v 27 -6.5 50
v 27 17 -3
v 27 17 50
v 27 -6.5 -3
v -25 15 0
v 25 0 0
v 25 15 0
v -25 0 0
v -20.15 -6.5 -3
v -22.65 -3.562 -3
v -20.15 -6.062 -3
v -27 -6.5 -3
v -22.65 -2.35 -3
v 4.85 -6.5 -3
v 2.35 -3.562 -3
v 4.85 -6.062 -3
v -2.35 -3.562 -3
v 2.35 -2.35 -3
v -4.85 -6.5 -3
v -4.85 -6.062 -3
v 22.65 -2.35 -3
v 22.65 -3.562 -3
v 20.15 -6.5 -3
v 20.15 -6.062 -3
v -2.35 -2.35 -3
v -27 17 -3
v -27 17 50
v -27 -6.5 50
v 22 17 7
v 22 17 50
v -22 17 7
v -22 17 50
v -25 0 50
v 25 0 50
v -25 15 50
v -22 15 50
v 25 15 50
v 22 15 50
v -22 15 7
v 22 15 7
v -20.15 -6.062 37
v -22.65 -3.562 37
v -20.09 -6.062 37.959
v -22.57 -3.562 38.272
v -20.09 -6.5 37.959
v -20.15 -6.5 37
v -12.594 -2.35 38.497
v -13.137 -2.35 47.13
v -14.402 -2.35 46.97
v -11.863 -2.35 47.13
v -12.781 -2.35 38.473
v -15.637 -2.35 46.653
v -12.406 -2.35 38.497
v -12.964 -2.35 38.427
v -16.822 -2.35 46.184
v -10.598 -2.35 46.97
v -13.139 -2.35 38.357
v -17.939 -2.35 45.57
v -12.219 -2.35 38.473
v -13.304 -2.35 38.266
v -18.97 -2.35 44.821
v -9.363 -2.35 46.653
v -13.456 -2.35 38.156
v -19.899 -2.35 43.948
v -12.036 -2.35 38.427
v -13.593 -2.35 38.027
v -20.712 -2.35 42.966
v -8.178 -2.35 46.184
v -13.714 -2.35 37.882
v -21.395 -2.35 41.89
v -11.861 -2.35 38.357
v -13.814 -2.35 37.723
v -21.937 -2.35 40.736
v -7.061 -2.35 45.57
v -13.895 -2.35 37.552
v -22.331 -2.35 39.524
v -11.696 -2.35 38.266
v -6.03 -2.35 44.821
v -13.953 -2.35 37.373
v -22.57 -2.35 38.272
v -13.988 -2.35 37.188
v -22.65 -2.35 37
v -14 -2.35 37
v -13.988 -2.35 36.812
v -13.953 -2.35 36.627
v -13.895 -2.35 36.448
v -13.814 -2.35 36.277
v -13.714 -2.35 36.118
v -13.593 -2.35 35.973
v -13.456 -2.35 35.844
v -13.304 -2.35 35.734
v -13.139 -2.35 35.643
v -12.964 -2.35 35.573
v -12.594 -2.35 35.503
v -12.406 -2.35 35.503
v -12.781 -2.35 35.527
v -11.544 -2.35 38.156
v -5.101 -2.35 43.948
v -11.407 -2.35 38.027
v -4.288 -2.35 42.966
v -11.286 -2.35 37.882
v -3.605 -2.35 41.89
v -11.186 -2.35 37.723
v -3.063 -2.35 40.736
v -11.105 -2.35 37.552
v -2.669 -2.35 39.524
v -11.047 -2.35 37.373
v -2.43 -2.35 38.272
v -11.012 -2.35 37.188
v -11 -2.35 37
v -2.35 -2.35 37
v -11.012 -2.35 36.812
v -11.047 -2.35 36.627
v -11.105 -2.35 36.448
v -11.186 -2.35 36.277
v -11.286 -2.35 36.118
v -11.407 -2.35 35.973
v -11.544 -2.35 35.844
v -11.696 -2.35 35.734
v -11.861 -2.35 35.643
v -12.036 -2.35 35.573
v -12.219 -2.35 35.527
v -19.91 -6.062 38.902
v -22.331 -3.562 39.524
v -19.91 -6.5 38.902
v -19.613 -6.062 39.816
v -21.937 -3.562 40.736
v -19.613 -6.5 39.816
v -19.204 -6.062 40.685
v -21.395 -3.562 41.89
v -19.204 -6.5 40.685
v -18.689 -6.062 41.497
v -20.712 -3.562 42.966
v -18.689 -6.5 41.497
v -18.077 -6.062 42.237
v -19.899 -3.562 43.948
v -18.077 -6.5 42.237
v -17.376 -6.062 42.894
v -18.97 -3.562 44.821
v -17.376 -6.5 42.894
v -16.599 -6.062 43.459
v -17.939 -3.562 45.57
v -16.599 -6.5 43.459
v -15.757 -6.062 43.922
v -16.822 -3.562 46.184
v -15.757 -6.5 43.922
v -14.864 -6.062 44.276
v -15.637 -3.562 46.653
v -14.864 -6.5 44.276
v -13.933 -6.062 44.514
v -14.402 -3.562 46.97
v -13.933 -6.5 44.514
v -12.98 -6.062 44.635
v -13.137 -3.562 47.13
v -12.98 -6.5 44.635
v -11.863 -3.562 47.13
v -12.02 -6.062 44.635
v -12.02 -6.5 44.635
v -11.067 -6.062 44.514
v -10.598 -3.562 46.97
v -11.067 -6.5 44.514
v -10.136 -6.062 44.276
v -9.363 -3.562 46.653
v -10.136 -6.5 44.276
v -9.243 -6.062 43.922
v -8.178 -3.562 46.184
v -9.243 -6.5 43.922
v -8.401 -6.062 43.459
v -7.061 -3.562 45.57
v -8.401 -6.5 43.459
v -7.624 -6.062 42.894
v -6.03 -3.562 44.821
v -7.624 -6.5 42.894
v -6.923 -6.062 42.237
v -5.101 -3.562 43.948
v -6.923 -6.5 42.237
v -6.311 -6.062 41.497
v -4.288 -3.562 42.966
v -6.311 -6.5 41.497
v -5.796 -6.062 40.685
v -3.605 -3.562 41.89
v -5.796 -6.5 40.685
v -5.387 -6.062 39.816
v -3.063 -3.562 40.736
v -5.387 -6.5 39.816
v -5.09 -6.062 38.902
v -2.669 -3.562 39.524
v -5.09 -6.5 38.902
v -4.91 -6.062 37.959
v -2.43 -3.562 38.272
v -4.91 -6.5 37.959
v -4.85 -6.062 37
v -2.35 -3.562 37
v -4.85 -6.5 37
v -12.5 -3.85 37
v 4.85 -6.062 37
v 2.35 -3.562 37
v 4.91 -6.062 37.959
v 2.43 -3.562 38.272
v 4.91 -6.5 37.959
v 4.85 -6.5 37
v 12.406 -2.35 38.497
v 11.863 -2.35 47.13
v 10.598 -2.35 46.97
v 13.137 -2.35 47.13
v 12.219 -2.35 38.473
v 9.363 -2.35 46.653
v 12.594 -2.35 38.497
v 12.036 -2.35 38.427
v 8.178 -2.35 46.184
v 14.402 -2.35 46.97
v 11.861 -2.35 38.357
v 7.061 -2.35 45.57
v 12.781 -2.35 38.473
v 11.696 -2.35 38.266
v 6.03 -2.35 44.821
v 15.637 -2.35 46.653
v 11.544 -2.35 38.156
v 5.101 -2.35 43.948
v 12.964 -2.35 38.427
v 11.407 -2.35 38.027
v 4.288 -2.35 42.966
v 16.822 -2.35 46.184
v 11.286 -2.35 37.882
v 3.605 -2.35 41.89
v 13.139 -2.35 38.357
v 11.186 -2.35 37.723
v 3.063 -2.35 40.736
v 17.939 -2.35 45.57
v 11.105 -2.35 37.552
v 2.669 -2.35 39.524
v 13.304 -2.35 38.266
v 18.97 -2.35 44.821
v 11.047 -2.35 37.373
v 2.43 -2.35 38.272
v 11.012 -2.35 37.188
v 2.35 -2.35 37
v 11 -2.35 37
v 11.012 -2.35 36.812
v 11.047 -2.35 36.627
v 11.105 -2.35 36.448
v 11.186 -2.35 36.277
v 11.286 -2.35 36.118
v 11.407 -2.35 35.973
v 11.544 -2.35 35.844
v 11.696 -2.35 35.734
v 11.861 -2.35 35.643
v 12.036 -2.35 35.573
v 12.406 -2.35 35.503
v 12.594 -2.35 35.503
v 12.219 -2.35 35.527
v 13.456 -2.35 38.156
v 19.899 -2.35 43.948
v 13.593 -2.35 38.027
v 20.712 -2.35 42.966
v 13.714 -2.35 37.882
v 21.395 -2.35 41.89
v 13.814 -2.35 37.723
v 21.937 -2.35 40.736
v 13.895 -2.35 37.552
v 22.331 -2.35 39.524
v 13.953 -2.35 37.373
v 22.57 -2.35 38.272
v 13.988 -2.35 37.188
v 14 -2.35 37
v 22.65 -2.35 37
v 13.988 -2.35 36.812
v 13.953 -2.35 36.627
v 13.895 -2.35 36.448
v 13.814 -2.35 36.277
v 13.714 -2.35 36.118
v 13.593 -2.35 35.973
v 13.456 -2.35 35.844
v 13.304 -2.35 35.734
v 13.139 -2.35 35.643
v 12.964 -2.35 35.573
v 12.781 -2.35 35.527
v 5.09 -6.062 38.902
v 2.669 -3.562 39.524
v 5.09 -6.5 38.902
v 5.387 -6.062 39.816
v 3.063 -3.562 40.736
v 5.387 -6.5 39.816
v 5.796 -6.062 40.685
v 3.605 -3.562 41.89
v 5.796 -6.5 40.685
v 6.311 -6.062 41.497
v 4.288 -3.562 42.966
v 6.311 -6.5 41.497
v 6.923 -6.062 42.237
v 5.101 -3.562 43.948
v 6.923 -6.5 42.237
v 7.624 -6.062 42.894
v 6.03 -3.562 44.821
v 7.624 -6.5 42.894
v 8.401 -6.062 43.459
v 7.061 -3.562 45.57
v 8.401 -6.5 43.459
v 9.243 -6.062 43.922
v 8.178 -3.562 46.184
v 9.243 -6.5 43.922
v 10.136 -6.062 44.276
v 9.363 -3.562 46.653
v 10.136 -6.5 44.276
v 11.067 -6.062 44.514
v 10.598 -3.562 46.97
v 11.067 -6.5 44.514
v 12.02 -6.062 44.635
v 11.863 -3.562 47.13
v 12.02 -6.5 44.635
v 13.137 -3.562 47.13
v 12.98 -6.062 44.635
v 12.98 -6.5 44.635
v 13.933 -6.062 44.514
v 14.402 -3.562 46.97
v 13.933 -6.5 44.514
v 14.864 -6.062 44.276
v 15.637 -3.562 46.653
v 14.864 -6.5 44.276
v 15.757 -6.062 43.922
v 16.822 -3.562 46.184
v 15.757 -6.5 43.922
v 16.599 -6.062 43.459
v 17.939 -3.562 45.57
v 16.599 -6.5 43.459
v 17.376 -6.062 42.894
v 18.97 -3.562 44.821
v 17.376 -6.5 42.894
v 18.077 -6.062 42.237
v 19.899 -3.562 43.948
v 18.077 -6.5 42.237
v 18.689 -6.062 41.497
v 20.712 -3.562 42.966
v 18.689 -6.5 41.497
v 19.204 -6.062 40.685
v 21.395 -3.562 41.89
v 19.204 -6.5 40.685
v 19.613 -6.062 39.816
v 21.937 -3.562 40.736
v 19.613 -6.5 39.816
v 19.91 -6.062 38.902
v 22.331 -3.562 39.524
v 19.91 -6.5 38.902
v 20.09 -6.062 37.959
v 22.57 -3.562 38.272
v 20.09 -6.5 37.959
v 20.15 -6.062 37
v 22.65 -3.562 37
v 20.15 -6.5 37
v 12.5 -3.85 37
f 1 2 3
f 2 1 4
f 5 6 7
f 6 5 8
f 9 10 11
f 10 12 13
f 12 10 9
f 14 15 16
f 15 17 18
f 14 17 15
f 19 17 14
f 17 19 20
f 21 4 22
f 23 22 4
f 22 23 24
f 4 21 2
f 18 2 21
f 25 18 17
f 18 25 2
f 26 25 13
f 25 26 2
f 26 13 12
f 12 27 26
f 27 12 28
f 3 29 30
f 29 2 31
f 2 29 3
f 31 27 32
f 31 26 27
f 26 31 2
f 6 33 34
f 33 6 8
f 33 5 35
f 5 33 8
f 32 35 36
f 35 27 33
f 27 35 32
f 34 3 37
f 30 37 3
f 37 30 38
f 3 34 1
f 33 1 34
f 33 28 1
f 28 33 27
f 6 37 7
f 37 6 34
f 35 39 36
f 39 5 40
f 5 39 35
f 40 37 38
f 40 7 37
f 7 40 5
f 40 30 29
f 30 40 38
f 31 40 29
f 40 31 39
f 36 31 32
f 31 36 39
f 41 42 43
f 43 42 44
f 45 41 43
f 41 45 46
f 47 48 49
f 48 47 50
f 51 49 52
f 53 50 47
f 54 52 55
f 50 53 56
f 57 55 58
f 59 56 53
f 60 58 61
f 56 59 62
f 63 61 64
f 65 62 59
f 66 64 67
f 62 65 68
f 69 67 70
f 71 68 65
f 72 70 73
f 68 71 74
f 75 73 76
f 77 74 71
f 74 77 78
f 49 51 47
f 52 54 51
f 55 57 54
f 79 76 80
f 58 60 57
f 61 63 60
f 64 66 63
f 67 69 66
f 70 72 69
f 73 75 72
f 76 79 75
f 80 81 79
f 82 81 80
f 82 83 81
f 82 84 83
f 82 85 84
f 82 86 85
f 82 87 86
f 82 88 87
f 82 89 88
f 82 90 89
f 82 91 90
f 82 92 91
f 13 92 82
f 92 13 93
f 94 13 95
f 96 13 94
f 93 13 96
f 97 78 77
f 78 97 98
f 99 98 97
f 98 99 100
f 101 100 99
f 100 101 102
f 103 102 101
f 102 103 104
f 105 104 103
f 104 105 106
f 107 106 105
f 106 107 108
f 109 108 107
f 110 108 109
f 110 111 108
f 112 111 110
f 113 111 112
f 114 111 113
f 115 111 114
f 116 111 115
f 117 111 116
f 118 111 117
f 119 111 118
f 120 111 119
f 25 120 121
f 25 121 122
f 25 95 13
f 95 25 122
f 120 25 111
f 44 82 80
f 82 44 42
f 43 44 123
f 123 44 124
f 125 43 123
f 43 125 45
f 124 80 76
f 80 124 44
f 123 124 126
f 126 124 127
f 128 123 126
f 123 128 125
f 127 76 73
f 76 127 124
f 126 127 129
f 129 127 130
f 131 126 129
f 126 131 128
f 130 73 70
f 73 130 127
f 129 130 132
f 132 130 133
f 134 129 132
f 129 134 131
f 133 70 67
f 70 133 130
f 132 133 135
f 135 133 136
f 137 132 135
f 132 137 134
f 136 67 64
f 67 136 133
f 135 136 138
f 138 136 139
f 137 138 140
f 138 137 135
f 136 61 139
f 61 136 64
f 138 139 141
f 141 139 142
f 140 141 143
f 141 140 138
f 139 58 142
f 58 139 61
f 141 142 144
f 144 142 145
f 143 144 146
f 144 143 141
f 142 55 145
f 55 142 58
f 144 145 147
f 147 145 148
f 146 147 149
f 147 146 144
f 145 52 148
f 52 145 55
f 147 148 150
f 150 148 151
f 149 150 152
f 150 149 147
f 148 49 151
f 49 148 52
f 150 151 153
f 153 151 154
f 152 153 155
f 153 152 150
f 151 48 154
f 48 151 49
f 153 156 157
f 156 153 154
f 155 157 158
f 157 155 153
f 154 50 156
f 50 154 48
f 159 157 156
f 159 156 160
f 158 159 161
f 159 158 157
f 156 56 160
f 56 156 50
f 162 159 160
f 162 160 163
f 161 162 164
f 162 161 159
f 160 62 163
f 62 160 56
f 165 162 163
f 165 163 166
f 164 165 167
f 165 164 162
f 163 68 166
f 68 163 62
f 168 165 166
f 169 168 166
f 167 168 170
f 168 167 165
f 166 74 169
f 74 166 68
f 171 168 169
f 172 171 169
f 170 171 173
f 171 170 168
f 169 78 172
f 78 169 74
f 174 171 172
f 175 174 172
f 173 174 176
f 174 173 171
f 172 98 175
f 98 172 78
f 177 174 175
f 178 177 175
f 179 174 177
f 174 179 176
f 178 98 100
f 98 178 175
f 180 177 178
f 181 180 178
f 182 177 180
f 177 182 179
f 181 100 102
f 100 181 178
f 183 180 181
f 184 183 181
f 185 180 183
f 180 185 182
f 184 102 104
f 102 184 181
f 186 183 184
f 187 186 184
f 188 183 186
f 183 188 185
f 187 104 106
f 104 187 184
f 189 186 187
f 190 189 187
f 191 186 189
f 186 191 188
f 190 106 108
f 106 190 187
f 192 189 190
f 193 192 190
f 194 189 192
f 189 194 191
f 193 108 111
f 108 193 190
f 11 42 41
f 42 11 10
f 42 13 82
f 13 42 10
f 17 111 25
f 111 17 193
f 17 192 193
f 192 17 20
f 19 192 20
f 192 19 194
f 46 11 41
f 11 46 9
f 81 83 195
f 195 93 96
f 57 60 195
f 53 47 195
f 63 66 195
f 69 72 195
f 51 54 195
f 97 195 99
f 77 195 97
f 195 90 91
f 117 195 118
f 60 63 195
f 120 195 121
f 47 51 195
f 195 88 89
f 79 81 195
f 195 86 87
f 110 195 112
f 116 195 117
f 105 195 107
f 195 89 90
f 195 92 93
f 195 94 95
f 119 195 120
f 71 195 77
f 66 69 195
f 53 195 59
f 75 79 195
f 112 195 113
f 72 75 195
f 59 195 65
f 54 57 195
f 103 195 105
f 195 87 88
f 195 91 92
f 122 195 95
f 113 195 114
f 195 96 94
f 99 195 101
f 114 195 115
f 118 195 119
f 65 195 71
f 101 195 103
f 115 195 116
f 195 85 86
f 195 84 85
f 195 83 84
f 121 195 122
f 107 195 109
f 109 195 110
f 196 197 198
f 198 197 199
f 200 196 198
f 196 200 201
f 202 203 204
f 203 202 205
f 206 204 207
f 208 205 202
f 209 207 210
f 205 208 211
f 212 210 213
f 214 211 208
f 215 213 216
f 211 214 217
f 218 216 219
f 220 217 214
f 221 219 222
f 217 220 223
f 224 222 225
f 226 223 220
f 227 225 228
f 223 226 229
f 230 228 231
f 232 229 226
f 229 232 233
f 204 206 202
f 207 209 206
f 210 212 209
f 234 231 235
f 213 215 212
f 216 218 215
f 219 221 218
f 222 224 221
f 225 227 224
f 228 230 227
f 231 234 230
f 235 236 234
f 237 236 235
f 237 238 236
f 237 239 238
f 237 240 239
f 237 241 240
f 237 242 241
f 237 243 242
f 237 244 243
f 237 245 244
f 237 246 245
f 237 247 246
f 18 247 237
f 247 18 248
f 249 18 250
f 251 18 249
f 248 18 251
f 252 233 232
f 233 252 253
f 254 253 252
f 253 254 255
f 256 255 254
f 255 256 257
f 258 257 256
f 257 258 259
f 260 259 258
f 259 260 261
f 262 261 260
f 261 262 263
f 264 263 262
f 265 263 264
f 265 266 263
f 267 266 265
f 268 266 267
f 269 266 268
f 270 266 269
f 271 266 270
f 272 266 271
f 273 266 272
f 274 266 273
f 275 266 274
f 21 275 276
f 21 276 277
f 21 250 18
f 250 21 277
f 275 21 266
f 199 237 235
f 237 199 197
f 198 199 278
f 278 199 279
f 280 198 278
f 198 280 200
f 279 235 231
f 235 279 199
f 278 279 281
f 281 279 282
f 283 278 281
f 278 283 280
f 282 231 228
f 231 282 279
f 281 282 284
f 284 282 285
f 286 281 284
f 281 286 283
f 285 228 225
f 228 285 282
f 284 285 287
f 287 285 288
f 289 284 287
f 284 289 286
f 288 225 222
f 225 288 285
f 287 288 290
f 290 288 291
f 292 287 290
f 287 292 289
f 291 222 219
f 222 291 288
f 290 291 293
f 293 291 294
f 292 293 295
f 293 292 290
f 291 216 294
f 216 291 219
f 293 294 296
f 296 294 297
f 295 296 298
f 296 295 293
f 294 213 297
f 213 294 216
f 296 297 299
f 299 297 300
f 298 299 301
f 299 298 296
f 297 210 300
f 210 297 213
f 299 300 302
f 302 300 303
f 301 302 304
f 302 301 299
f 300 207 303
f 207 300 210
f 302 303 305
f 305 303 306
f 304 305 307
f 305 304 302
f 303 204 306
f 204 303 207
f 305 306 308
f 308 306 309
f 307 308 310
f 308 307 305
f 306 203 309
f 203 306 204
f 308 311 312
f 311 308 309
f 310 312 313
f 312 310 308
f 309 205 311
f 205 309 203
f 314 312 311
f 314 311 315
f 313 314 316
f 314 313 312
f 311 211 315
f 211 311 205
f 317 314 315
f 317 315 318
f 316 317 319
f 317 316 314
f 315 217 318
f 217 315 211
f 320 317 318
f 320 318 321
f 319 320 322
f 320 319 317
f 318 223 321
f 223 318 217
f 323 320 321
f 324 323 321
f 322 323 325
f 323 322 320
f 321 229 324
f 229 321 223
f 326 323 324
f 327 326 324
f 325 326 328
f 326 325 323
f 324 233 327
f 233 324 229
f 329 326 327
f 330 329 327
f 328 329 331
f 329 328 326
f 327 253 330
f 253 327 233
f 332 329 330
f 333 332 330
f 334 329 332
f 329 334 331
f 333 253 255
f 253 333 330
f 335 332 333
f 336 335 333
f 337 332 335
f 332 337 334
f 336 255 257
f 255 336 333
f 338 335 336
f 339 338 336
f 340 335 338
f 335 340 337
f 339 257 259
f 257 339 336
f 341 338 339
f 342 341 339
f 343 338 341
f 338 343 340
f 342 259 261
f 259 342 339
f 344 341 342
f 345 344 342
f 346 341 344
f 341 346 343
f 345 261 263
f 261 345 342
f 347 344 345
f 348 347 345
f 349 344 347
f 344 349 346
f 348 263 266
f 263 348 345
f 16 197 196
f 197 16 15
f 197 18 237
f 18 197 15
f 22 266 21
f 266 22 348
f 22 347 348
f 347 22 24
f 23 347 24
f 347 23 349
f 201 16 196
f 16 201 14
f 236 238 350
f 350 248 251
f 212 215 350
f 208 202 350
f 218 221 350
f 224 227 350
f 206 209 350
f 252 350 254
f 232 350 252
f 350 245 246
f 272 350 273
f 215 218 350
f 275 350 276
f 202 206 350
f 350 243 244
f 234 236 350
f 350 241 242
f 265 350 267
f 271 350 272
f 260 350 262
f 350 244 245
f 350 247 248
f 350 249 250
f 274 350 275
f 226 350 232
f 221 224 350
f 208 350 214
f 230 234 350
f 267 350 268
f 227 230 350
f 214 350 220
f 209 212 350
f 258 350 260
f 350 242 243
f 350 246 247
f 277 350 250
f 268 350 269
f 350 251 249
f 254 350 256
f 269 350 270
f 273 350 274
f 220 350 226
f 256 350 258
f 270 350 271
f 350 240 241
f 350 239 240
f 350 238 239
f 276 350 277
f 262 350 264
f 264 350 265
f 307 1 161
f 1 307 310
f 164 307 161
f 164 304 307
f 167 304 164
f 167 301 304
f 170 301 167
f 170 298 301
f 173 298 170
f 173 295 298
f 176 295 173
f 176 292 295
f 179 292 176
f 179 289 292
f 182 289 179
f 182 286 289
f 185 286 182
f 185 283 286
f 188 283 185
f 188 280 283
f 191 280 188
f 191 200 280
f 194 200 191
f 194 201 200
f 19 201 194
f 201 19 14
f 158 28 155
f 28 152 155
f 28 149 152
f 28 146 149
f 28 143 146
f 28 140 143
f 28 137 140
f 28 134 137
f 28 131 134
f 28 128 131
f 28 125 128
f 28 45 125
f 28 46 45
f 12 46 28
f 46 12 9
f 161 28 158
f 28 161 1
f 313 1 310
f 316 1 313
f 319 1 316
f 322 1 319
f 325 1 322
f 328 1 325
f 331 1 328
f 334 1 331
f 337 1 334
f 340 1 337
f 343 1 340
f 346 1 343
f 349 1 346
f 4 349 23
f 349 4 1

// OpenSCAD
/*Created by Andy Levesque
Credit to @David D on Printables and Jonathan at Keep Making for Multiconnect and Multiboard, respectively
Licensed Creative Commons 4.0 Attribution Non-Commercial Sharable with Attribution

Notes:
- Slot test fit - For a slot test fit, set the following parameters
    - internalDepth = 0
    - internalHeight = 25
    - internalWidth = 0
    - wallThickness = 0
*/

/* [Internal Dimensions] */
//Height (in mm) from the top of the back to the base of the internal floor
internalHeight = 50.0; //.1
//Width (in mm) of the internal dimension or item you wish to hold
internalWidth = 50.0; //.1
//Length (i.e., distance from back) (in mm) of the internal dimension or item you wish to hold
internalDepth = 15.0; //.1

/* [Front Cutout Customizations] */
//cut out the front
frontCutout = true; 
//Distance upward from the bottom (in mm) that captures the bottom front of the item
frontLowerCapture = 7;
//Distance downward from the top (in mm) that captures the top front of the item. Use zero (0) for a cutout top. May require printing supports if used. 
frontUpperCapture = 0;
//Distance inward from the sides (in mm) that captures the sides of the item
frontLateralCapture = 3;


/*[Bottom Cutout Customizations]*/
//Cut out the bottom 
bottomCutout = false;
//Distance inward from the front (in mm) that captures the bottom of the item
bottomFrontCapture = 3;
//Distance inward from the back (in mm) that captures the bottom of the item
bottomBackCapture = 3;
//Distance inward from the sides (in mm) that captures the bottom of the item
bottomSideCapture = 3;

/*[Cord Cutout Customizations]*/
//cut out a slot on the bottom and through the front for a cord to connect to the device
cordCutout = false;
//diameter/width of cord cutout
cordCutoutDiameter = 10;
//move the cord cutout left (positive) or right (negative) (in mm)
cordCutoutLateralOffset = 0;
//move the cord cutout forward (positive) and back (negative) (in mm)
cordCutoutDepthOffset = 0;

/* [Right Cutout Customizations] */
rightCutout = false; 
//Distance upward from the bottom (in mm) that captures the bottom right of the item
rightLowerCapture = 7;
//Distance downward from the top (in mm) that captures the bottom right of the item. Use zero (0) for a cutout top. May require printing supports if used. 
rightUpperCapture = 0;
//Distance inward from the sides (in mm) that captures the sides of the item
rightLateralCapture = 3;


/* [Left Cutout Customizations] */
leftCutout = false; 
//Distance upward from the bottom (in mm) that captures the upper left of the item
leftLowerCapture = 7;
//Distance downward from the top (in mm) that captures the upper left of the item. Use zero (0) for a cutout top. May require printing supports if used. 
leftUpperCapture = 0;
//Distance inward from the sides (in mm) that captures the sides of the item
leftLateralCapture = 3;


/* [Additional Customization] */
//Thickness of bin walls (in mm)
wallThickness = 2; //.1
//Thickness of bin  (in mm)
baseThickness = 3; //.1

/*[Slot Customization]*/
//Distance between Multiconnect slots on the back (25mm is standard for MultiBoard)
distanceBetweenSlots = 25;
//QuickRelease removes the small indent in the top of the slots that lock the part into place
slotQuickRelease = false;
//Dimple scale tweaks the size of the dimple in the slot for printers that need a larger dimple to print correctly
dimpleScale = 1; //[0.5:.05:1.5]
//Scale the size of slots in the back (1.015 scale is default for a tight fit. Increase if your finding poor fit. )
slotTolerance = 1.00; //[0.925:0.005:1.075]
//Move the slot in (positive) or out (negative)
slotDepthMicroadjustment = 0; //[-.5:0.05:.5]

/* [Hidden] */
//Thickness of the back of the item (default in 6.5mm). Changes are untested. 
backThickness = 6.5; //.1
//profile coordinates for the multiconnect slot
slotProfile = [[0,0],[10.15,0],[10.15,1.2121],[7.65,3.712],[7.65,5],[0,5]];


//Calculated
totalHeight = internalHeight+baseThickness;
totalDepth = internalDepth + backThickness + wallThickness;
totalWidth = max(internalWidth + wallThickness*2,25);
totalCenterX = internalWidth/2;
//slot count calculates how many slots can fit on the back. Based on internal width for buffer.
slotCount = floor(totalWidth/distanceBetweenSlots);
echo(str("Slot Count: ",slotCount));

//move to center
translate(v = [-internalWidth/2,0,0]) 
    basket();
    //slotted back
translate([-totalWidth/2,0,-baseThickness])
    multiconnectBack(backWidth = totalWidth, backHeight = totalHeight);

//Create Basket
module basket() {
    difference() {
        union() {
            //bottom
            translate([-wallThickness,0,-baseThickness])
                cube([internalWidth + wallThickness*2, internalDepth + wallThickness,baseThickness]);

            //left wall
            translate([-wallThickness,0,0])
                cube([wallThickness, internalDepth + wallThickness, internalHeight]);

            //right wall
            translate([internalWidth,0,0])
                cube([wallThickness, internalDepth + wallThickness, internalHeight]);

            //front wall
                translate([0,internalDepth,0])
                    cube([internalWidth,wallThickness,internalHeight]);
        }

        //frontCaptureDeleteTool for item holders
            if (frontCutout == true)
                translate([frontLateralCapture,internalDepth-1,frontLowerCapture])
                    color("red") cube([internalWidth-frontLateralCapture*2,wallThickness+2,internalHeight-frontLowerCapture-frontUpperCapture+0.01]);
            if (bottomCutout == true)
                translate(v = [bottomSideCapture,bottomBackCapture,-baseThickness-1]) 
                    color("orange") cube([internalWidth-bottomSideCapture*2,internalDepth-bottomFrontCapture-bottomBackCapture,baseThickness+2]);
                    //frontCaptureDeleteTool for item holders
            if (rightCutout == true)
                translate([-wallThickness-1,rightLateralCapture,rightLowerCapture])
                    color("green") cube([wallThickness+2,internalDepth-rightLateralCapture*2,internalHeight-rightLowerCapture-rightUpperCapture+0.01]);
            if (leftCutout == true)
                translate([internalWidth-1,leftLateralCapture,leftLowerCapture])
                    color("blue") cube([wallThickness+2,internalDepth-leftLateralCapture*2,internalHeight-leftLowerCapture-leftUpperCapture+0.01]);
            if (cordCutout == true) {
                translate(v = [internalWidth/2+cordCutoutLateralOffset,internalDepth/2+cordCutoutDepthOffset,-baseThickness-1]) {
                    union(){
                        color("purple") cylinder(h = baseThickness + frontLowerCapture + 2, r = cordCutoutDiameter/2);
                        translate(v = [-cordCutoutDiameter/2,0,0]) color("pink") cube([cordCutoutDiameter,internalWidth/2+wallThickness+1,baseThickness + frontLowerCapture + 2]);
                    }
                }
            }
    }
    
}


//BEGIN MODULES
//Slotted back
module multiconnectBack(backWidth, backHeight)
{
    difference() {
        translate(v = [0,-6.5,0]) cube(size = [backWidth,6.5,backHeight]);
        //Loop through slots and center on the item
        //Note: I kept doing math until it looked right. It's possible this can be simplified.
        for (slotNum = [0:1:slotCount-1]) {
            translate(v = [distanceBetweenSlots/2+(backWidth/distanceBetweenSlots-slotCount)*distanceBetweenSlots/2+slotNum*distanceBetweenSlots,-2.35+slotDepthMicroadjustment,backHeight-13]) {
                color(c = "red")  slotTool(backHeight);
            }
        }
    }
    //Create Slot Tool
    module slotTool(totalHeight) {
        scale(v = slotTolerance)
        difference() {
            union() {
                //round top
                rotate(a = [90,0,0,]) 
                    rotate_extrude($fn=50) 
                        polygon(points = slotProfile);
                //long slot
                translate(v = [0,0,0]) 
                    rotate(a = [180,0,0]) 
                    linear_extrude(height = totalHeight+1) 
                        union(){
                            polygon(points = slotProfile);
                            mirror([1,0,0])
                                polygon(points = slotProfile);
                        }
            }
            //dimple
            if (slotQuickRelease == false)
                scale(v = dimpleScale) 
                rotate(a = [90,0,0,]) 
                    rotate_extrude($fn=50) 
                        polygon(points = [[0,0],[0,1.5],[1.5,0]]);
        }
    }
}
